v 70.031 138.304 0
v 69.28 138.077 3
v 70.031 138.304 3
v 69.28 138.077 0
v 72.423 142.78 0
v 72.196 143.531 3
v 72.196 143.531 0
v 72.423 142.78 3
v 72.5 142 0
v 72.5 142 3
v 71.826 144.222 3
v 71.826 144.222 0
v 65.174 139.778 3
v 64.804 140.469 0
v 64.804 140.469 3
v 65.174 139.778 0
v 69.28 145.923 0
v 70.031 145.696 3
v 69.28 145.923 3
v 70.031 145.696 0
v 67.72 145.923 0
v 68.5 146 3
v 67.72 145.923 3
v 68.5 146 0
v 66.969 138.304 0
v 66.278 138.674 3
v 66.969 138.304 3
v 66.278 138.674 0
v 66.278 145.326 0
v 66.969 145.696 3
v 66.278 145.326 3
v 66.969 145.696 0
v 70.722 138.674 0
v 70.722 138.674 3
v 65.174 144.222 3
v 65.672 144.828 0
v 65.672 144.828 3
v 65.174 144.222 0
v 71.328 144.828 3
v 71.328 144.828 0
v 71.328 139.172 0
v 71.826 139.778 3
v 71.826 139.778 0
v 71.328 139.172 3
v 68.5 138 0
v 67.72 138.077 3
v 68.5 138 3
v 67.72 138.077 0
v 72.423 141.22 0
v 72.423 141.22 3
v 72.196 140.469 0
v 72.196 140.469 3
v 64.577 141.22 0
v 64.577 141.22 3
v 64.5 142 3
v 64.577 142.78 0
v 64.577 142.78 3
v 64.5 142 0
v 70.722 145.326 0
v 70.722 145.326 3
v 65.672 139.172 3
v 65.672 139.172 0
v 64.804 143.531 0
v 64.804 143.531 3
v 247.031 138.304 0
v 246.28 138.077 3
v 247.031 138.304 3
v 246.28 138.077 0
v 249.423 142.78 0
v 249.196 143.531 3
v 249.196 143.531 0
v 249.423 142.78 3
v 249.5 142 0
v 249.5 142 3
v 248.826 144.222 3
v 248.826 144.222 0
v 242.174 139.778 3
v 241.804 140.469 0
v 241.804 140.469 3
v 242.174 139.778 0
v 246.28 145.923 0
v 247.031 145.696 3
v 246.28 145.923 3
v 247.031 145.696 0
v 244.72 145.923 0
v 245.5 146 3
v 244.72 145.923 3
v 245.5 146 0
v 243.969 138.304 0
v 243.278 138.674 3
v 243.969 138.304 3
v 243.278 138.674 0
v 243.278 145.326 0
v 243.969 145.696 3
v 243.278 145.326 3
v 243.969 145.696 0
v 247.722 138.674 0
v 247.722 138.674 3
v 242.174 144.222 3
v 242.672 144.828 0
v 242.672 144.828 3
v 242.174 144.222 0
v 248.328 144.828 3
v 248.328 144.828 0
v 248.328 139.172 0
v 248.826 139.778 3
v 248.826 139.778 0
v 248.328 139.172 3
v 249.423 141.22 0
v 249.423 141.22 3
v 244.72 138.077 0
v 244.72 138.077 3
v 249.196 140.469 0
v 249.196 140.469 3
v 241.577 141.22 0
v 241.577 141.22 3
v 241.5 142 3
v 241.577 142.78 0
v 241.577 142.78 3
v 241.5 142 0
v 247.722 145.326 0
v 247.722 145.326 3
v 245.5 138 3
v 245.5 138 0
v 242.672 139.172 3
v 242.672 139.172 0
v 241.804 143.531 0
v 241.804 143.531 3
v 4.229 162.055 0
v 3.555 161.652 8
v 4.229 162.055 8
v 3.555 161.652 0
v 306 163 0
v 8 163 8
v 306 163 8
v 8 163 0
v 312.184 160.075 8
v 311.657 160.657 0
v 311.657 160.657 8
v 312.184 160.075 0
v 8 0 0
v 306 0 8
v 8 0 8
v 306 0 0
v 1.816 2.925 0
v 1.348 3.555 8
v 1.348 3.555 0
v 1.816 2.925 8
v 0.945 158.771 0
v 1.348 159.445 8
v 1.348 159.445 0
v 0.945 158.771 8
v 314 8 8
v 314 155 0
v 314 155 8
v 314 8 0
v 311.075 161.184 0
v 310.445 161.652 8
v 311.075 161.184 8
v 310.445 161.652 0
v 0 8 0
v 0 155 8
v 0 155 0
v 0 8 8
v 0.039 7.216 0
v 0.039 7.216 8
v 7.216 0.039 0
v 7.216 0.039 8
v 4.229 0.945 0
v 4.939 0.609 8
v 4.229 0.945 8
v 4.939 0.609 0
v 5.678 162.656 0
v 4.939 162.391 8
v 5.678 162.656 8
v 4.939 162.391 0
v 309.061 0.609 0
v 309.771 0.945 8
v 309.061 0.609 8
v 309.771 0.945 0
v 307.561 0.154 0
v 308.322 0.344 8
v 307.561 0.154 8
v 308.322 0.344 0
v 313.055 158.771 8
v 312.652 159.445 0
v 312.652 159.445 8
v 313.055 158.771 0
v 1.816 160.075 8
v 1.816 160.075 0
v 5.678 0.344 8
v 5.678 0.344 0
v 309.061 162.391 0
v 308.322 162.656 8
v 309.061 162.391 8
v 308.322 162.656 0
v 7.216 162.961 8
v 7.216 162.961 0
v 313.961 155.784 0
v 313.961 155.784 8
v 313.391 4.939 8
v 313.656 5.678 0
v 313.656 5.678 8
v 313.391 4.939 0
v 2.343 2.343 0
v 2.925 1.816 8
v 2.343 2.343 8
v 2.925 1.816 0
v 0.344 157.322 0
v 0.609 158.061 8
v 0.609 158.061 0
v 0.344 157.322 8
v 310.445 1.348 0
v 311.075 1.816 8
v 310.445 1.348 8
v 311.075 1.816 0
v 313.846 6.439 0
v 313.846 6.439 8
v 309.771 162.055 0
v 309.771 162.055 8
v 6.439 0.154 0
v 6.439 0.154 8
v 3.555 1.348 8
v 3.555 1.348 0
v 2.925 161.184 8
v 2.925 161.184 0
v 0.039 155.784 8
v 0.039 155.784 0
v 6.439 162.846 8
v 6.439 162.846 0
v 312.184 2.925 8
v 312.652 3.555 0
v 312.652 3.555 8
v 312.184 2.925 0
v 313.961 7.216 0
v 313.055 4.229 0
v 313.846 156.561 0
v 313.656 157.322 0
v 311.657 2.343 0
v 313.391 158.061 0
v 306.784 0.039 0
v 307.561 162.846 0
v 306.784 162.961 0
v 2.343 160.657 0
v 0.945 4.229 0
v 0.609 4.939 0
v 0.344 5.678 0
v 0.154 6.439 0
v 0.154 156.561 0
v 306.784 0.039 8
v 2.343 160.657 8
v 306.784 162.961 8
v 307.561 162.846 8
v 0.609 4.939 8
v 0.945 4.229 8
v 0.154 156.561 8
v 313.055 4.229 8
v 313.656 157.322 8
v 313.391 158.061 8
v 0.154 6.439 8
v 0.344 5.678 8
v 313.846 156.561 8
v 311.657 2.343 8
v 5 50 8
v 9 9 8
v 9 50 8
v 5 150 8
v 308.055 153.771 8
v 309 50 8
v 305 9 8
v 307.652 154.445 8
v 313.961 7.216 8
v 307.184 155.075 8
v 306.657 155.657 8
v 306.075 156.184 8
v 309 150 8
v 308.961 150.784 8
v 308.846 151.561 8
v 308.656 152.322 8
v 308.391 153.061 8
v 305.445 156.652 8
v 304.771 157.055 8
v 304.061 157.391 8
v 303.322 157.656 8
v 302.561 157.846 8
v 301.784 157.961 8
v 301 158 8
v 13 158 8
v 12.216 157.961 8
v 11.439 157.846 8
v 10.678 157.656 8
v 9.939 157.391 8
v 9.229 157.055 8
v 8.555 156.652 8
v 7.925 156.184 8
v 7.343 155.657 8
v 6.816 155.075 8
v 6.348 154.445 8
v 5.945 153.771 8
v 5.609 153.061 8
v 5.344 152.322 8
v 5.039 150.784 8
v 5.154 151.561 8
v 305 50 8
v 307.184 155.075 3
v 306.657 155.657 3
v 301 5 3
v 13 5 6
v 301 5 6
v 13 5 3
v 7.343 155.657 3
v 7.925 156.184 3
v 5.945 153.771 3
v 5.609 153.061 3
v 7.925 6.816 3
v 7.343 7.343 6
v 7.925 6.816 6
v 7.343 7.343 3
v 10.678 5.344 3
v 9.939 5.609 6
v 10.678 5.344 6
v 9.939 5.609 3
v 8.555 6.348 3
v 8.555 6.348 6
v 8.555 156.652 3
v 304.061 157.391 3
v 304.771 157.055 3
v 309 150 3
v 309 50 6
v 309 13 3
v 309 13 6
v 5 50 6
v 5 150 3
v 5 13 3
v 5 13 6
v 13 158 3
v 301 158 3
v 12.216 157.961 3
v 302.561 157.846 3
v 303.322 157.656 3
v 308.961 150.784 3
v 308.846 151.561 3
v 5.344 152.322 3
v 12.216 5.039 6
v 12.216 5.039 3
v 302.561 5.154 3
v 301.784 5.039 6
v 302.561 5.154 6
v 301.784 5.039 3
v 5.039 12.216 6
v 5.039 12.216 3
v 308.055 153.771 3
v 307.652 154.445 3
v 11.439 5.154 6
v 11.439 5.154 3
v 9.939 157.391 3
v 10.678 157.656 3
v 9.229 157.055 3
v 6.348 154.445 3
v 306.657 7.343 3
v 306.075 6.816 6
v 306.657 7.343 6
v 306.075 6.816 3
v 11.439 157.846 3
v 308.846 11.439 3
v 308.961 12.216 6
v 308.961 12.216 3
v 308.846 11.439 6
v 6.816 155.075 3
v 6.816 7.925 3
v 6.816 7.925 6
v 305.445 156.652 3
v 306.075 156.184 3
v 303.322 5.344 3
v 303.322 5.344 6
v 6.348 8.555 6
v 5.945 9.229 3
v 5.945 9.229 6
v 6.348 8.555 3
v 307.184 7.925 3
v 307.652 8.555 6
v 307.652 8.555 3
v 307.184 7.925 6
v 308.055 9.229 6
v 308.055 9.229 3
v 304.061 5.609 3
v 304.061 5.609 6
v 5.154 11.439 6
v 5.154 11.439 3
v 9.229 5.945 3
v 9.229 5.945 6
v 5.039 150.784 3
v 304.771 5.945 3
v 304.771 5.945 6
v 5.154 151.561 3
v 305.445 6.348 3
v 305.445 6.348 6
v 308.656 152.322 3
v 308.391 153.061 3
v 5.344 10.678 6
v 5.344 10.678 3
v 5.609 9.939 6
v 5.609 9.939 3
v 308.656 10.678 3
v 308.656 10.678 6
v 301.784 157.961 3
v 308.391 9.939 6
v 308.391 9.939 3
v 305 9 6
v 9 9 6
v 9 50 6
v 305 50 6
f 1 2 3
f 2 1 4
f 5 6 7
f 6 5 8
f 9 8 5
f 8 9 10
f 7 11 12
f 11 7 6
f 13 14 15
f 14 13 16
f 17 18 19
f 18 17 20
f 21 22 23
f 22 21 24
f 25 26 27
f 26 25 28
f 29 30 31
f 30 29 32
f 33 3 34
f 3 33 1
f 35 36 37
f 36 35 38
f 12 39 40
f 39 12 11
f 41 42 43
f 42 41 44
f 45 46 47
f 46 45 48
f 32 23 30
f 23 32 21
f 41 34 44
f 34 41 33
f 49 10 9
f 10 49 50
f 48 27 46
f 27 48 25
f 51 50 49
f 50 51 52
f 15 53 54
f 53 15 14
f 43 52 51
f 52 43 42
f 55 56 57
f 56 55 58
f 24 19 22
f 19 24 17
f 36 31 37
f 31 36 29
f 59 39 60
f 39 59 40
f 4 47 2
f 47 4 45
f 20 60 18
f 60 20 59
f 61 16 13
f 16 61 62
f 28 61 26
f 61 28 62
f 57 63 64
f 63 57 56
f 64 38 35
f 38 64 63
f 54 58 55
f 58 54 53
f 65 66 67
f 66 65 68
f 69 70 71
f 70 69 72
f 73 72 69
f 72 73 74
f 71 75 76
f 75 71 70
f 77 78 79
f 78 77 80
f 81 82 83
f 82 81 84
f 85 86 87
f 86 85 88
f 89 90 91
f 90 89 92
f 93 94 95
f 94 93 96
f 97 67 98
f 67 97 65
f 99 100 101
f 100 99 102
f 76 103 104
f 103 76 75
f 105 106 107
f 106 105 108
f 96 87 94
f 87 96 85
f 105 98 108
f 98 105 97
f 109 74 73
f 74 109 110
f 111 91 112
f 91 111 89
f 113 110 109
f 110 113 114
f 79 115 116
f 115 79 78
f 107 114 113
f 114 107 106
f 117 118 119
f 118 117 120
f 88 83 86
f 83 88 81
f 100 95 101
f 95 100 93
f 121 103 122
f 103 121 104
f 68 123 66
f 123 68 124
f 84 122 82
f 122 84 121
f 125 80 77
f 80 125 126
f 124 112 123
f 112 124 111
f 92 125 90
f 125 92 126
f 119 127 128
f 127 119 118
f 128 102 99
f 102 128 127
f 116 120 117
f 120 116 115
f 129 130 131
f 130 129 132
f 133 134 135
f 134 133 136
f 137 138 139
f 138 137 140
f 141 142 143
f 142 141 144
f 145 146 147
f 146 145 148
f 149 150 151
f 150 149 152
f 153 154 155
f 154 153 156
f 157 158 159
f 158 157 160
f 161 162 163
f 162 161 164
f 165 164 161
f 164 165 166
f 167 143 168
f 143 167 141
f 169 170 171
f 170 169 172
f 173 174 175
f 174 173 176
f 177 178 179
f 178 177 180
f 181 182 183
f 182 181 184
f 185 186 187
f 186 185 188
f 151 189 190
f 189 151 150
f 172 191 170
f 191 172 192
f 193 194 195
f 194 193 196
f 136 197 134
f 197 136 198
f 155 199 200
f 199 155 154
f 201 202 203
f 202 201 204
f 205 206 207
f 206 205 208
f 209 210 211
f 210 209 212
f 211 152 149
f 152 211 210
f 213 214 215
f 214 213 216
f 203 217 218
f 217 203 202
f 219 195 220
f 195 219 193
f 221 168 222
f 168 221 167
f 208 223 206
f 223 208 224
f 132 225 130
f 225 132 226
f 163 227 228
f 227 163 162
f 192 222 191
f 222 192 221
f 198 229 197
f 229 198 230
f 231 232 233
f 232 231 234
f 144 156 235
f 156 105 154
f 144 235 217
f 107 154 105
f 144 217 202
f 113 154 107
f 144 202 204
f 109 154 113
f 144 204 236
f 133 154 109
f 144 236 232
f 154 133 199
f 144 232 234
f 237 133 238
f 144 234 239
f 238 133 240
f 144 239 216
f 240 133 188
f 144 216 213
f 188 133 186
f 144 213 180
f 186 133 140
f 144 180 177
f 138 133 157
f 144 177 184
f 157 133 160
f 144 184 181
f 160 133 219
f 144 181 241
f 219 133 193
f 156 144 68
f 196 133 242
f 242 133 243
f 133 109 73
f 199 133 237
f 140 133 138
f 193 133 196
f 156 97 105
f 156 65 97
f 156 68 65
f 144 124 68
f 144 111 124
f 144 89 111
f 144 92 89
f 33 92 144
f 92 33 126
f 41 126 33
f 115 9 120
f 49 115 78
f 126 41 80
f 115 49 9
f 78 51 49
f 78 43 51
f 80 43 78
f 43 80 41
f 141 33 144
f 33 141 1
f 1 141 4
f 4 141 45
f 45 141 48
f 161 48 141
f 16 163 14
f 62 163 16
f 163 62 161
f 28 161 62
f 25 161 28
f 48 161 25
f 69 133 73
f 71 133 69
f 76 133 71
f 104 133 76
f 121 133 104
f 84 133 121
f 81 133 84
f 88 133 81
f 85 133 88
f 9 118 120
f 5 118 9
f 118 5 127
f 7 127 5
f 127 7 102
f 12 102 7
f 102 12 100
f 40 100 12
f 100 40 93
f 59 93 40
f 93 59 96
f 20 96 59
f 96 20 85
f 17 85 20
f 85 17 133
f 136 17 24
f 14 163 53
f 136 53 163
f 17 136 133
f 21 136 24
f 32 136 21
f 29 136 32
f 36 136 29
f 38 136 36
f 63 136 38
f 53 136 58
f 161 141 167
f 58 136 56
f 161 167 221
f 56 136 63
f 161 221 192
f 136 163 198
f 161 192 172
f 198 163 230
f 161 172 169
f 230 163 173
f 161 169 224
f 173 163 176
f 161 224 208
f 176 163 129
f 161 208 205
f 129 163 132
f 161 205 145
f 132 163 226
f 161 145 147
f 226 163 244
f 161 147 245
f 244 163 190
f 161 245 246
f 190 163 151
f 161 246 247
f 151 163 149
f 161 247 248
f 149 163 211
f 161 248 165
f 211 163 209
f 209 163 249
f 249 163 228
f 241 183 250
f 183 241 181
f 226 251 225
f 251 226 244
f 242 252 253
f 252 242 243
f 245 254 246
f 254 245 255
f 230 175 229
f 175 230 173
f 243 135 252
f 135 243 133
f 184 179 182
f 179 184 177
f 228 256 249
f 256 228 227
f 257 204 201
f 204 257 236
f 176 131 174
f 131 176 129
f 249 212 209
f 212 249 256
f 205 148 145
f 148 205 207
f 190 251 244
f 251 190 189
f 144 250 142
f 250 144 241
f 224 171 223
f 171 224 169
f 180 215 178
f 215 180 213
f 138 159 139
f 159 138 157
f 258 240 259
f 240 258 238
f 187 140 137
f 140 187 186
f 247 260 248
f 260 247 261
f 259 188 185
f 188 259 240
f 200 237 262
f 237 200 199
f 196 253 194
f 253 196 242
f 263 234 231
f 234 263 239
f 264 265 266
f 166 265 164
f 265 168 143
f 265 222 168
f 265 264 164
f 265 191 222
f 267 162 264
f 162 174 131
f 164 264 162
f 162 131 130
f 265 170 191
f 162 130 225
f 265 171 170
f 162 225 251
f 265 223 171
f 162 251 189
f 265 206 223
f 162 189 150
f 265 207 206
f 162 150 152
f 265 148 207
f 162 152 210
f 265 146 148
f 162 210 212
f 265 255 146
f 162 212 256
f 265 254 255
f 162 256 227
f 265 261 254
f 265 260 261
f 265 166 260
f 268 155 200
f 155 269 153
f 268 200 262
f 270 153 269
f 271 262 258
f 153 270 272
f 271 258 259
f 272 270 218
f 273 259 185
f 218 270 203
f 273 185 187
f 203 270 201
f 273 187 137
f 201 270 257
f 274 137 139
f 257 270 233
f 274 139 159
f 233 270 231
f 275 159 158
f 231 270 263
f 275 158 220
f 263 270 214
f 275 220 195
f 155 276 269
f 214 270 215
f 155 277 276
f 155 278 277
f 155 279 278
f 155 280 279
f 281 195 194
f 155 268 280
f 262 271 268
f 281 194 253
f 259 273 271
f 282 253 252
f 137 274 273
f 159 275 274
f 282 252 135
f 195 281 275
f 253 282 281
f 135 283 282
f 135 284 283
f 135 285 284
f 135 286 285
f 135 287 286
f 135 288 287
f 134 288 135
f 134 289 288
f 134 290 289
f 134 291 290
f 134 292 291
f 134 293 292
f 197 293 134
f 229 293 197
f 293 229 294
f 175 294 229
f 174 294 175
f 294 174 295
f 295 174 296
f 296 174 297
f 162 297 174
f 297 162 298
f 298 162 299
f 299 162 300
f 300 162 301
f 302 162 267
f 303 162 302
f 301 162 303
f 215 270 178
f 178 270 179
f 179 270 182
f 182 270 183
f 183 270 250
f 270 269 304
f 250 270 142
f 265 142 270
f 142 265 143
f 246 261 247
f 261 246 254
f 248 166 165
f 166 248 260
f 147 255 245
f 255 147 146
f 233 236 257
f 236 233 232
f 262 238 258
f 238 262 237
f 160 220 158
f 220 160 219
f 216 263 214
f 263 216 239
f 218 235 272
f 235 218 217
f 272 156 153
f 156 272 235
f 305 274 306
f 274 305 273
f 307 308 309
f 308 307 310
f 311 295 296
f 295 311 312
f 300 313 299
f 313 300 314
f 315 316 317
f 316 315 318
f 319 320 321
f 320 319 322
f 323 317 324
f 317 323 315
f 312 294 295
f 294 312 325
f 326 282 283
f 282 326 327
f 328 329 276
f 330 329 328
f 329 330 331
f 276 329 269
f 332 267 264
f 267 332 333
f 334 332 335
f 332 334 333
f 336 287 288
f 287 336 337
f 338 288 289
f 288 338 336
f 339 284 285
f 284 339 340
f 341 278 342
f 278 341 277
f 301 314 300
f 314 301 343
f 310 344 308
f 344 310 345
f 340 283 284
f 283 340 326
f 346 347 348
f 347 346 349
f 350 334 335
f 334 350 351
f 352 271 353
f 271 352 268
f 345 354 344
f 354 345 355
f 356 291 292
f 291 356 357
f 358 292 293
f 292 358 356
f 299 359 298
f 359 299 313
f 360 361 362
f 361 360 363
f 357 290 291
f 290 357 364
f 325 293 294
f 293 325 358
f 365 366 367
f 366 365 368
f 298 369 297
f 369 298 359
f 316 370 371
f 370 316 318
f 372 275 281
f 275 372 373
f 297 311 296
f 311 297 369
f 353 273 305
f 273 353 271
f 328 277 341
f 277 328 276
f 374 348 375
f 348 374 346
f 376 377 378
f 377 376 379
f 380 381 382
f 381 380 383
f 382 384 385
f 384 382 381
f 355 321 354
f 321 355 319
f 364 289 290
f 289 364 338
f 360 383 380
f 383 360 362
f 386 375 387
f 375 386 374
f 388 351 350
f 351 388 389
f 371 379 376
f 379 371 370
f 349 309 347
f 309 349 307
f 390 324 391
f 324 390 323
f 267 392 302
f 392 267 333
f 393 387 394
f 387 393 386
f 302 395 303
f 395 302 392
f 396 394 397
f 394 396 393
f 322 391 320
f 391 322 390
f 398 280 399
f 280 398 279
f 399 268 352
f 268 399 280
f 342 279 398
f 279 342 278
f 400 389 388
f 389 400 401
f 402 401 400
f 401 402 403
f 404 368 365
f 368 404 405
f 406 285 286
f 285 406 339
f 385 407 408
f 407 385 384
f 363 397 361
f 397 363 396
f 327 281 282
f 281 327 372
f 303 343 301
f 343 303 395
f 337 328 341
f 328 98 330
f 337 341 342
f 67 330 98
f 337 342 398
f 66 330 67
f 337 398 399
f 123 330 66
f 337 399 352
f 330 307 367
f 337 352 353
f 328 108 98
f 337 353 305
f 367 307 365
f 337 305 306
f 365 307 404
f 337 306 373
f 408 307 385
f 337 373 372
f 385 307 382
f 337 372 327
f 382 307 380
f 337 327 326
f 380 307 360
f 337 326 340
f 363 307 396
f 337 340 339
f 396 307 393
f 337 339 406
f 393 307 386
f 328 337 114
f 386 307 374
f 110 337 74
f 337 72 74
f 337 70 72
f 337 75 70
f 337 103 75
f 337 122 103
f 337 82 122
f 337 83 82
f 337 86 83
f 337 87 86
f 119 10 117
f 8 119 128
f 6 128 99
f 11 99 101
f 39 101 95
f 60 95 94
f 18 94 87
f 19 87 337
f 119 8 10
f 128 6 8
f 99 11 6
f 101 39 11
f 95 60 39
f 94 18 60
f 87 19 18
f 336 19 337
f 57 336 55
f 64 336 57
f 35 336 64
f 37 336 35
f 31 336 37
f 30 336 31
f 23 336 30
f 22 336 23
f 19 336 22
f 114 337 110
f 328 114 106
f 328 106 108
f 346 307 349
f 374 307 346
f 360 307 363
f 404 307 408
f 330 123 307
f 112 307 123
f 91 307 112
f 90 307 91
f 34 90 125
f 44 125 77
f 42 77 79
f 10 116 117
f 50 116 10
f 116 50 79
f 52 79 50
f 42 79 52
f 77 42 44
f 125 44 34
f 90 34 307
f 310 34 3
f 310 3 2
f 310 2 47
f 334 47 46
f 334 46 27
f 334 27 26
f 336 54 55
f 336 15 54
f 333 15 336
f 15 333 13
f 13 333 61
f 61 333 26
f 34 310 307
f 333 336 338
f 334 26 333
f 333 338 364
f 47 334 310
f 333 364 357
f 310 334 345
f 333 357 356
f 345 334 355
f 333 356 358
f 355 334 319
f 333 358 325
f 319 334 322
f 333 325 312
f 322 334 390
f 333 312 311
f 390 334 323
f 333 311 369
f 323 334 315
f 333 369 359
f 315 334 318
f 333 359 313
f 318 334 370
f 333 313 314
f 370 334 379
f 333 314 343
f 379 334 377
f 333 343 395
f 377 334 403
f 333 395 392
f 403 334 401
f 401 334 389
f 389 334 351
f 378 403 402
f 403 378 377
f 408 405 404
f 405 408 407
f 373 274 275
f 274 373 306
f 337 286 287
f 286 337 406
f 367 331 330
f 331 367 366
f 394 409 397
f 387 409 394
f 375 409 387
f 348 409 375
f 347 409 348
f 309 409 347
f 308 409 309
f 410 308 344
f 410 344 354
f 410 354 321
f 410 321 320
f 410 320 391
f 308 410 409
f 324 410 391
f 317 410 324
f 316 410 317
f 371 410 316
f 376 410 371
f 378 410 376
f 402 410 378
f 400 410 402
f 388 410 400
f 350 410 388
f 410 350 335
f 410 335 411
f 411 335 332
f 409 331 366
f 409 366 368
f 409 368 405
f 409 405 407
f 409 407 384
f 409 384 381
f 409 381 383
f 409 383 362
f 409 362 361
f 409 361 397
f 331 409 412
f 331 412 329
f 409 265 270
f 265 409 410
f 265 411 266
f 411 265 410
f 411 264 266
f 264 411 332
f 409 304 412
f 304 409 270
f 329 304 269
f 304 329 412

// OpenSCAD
// License Plate Frame
// Configurable parameters

// Outer frame dimensions
frame_length   = 314;   // mm
frame_width    = 163;   // mm
frame_thick    = 8;     // mm
corner_radius  = 8;  // mm

// Mounting holes
hole_dia      = 8;      // mm
hole_spacing  = 177;    // mm, center to center
hole_from_top = 21;     // mm, from top edge to hole center

// Plate dimensions
plate_length  = 304;    // mm
plate_width   = 153;    // mm
plate_depth   = 5;      // mm

// Retaining lip (plate slides in from top)
lip_overhang    = 4;    // mm, how far lip extends over the plate edge
lip_side_height = 50;   // mm, how far up each side the lip extends
lip_thick       = 2;    // mm, thickness of the lip

// Derived border widths
border_x = (frame_length - plate_length) / 2;
border_y = (frame_width  - plate_width)  / 2;

// Clip everything to the outer frame boundary so the lip corners match the frame radius
intersection() {
    union() {
        difference() {
            // Base rectangle with rounded corners
            hull() {
                translate([corner_radius, corner_radius, 0])
                    cylinder(r=corner_radius, h=frame_thick, $fn=64);
                translate([frame_length - corner_radius, corner_radius, 0])
                    cylinder(r=corner_radius, h=frame_thick, $fn=64);
                translate([corner_radius, frame_width - corner_radius, 0])
                    cylinder(r=corner_radius, h=frame_thick, $fn=64);
                translate([frame_length - corner_radius, frame_width - corner_radius, 0])
                    cylinder(r=corner_radius, h=frame_thick, $fn=64);
            }

            // Mounting holes (top edge, centered horizontally)
            for (x_offset = [-hole_spacing/2, hole_spacing/2]) {
                translate([frame_length/2 + x_offset, frame_width - hole_from_top, -1])
                    cylinder(d=hole_dia, h=frame_thick + 2, $fn=32);
            }

            // License plate pocket (centered, recessed from top face, matching corner radius)
            translate([border_x, border_y, frame_thick - plate_depth])
                hull() {
                    translate([corner_radius, corner_radius, 0])
                        cylinder(r=corner_radius, h=plate_depth + 1, $fn=64);
                    translate([plate_length - corner_radius, corner_radius, 0])
                        cylinder(r=corner_radius, h=plate_depth + 1, $fn=64);
                    translate([corner_radius, plate_width - corner_radius, 0])
                        cylinder(r=corner_radius, h=plate_depth + 1, $fn=64);
                    translate([plate_length - corner_radius, plate_width - corner_radius, 0])
                        cylinder(r=corner_radius, h=plate_depth + 1, $fn=64);
                }
        }

        // Retaining lip — sits at top of frame, extends over plate pocket edges
        // Bottom strip (full length)
        translate([0, 0, frame_thick - lip_thick])
            cube([frame_length, border_y + lip_overhang, lip_thick]);

        // Left side strip
        translate([0, 0, frame_thick - lip_thick])
            cube([border_x + lip_overhang, lip_side_height, lip_thick]);

        // Right side strip
        translate([frame_length - border_x - lip_overhang, 0, frame_thick - lip_thick])
            cube([border_x + lip_overhang, lip_side_height, lip_thick]);
    }

    // Outer boundary — clips the lip's square corners to the frame's corner radius
    hull() {
        translate([corner_radius, corner_radius, 0])
            cylinder(r=corner_radius, h=frame_thick, $fn=64);
        translate([frame_length - corner_radius, corner_radius, 0])
            cylinder(r=corner_radius, h=frame_thick, $fn=64);
        translate([corner_radius, frame_width - corner_radius, 0])
            cylinder(r=corner_radius, h=frame_thick, $fn=64);
        translate([frame_length - corner_radius, frame_width - corner_radius, 0])
            cylinder(r=corner_radius, h=frame_thick, $fn=64);
    }
}
